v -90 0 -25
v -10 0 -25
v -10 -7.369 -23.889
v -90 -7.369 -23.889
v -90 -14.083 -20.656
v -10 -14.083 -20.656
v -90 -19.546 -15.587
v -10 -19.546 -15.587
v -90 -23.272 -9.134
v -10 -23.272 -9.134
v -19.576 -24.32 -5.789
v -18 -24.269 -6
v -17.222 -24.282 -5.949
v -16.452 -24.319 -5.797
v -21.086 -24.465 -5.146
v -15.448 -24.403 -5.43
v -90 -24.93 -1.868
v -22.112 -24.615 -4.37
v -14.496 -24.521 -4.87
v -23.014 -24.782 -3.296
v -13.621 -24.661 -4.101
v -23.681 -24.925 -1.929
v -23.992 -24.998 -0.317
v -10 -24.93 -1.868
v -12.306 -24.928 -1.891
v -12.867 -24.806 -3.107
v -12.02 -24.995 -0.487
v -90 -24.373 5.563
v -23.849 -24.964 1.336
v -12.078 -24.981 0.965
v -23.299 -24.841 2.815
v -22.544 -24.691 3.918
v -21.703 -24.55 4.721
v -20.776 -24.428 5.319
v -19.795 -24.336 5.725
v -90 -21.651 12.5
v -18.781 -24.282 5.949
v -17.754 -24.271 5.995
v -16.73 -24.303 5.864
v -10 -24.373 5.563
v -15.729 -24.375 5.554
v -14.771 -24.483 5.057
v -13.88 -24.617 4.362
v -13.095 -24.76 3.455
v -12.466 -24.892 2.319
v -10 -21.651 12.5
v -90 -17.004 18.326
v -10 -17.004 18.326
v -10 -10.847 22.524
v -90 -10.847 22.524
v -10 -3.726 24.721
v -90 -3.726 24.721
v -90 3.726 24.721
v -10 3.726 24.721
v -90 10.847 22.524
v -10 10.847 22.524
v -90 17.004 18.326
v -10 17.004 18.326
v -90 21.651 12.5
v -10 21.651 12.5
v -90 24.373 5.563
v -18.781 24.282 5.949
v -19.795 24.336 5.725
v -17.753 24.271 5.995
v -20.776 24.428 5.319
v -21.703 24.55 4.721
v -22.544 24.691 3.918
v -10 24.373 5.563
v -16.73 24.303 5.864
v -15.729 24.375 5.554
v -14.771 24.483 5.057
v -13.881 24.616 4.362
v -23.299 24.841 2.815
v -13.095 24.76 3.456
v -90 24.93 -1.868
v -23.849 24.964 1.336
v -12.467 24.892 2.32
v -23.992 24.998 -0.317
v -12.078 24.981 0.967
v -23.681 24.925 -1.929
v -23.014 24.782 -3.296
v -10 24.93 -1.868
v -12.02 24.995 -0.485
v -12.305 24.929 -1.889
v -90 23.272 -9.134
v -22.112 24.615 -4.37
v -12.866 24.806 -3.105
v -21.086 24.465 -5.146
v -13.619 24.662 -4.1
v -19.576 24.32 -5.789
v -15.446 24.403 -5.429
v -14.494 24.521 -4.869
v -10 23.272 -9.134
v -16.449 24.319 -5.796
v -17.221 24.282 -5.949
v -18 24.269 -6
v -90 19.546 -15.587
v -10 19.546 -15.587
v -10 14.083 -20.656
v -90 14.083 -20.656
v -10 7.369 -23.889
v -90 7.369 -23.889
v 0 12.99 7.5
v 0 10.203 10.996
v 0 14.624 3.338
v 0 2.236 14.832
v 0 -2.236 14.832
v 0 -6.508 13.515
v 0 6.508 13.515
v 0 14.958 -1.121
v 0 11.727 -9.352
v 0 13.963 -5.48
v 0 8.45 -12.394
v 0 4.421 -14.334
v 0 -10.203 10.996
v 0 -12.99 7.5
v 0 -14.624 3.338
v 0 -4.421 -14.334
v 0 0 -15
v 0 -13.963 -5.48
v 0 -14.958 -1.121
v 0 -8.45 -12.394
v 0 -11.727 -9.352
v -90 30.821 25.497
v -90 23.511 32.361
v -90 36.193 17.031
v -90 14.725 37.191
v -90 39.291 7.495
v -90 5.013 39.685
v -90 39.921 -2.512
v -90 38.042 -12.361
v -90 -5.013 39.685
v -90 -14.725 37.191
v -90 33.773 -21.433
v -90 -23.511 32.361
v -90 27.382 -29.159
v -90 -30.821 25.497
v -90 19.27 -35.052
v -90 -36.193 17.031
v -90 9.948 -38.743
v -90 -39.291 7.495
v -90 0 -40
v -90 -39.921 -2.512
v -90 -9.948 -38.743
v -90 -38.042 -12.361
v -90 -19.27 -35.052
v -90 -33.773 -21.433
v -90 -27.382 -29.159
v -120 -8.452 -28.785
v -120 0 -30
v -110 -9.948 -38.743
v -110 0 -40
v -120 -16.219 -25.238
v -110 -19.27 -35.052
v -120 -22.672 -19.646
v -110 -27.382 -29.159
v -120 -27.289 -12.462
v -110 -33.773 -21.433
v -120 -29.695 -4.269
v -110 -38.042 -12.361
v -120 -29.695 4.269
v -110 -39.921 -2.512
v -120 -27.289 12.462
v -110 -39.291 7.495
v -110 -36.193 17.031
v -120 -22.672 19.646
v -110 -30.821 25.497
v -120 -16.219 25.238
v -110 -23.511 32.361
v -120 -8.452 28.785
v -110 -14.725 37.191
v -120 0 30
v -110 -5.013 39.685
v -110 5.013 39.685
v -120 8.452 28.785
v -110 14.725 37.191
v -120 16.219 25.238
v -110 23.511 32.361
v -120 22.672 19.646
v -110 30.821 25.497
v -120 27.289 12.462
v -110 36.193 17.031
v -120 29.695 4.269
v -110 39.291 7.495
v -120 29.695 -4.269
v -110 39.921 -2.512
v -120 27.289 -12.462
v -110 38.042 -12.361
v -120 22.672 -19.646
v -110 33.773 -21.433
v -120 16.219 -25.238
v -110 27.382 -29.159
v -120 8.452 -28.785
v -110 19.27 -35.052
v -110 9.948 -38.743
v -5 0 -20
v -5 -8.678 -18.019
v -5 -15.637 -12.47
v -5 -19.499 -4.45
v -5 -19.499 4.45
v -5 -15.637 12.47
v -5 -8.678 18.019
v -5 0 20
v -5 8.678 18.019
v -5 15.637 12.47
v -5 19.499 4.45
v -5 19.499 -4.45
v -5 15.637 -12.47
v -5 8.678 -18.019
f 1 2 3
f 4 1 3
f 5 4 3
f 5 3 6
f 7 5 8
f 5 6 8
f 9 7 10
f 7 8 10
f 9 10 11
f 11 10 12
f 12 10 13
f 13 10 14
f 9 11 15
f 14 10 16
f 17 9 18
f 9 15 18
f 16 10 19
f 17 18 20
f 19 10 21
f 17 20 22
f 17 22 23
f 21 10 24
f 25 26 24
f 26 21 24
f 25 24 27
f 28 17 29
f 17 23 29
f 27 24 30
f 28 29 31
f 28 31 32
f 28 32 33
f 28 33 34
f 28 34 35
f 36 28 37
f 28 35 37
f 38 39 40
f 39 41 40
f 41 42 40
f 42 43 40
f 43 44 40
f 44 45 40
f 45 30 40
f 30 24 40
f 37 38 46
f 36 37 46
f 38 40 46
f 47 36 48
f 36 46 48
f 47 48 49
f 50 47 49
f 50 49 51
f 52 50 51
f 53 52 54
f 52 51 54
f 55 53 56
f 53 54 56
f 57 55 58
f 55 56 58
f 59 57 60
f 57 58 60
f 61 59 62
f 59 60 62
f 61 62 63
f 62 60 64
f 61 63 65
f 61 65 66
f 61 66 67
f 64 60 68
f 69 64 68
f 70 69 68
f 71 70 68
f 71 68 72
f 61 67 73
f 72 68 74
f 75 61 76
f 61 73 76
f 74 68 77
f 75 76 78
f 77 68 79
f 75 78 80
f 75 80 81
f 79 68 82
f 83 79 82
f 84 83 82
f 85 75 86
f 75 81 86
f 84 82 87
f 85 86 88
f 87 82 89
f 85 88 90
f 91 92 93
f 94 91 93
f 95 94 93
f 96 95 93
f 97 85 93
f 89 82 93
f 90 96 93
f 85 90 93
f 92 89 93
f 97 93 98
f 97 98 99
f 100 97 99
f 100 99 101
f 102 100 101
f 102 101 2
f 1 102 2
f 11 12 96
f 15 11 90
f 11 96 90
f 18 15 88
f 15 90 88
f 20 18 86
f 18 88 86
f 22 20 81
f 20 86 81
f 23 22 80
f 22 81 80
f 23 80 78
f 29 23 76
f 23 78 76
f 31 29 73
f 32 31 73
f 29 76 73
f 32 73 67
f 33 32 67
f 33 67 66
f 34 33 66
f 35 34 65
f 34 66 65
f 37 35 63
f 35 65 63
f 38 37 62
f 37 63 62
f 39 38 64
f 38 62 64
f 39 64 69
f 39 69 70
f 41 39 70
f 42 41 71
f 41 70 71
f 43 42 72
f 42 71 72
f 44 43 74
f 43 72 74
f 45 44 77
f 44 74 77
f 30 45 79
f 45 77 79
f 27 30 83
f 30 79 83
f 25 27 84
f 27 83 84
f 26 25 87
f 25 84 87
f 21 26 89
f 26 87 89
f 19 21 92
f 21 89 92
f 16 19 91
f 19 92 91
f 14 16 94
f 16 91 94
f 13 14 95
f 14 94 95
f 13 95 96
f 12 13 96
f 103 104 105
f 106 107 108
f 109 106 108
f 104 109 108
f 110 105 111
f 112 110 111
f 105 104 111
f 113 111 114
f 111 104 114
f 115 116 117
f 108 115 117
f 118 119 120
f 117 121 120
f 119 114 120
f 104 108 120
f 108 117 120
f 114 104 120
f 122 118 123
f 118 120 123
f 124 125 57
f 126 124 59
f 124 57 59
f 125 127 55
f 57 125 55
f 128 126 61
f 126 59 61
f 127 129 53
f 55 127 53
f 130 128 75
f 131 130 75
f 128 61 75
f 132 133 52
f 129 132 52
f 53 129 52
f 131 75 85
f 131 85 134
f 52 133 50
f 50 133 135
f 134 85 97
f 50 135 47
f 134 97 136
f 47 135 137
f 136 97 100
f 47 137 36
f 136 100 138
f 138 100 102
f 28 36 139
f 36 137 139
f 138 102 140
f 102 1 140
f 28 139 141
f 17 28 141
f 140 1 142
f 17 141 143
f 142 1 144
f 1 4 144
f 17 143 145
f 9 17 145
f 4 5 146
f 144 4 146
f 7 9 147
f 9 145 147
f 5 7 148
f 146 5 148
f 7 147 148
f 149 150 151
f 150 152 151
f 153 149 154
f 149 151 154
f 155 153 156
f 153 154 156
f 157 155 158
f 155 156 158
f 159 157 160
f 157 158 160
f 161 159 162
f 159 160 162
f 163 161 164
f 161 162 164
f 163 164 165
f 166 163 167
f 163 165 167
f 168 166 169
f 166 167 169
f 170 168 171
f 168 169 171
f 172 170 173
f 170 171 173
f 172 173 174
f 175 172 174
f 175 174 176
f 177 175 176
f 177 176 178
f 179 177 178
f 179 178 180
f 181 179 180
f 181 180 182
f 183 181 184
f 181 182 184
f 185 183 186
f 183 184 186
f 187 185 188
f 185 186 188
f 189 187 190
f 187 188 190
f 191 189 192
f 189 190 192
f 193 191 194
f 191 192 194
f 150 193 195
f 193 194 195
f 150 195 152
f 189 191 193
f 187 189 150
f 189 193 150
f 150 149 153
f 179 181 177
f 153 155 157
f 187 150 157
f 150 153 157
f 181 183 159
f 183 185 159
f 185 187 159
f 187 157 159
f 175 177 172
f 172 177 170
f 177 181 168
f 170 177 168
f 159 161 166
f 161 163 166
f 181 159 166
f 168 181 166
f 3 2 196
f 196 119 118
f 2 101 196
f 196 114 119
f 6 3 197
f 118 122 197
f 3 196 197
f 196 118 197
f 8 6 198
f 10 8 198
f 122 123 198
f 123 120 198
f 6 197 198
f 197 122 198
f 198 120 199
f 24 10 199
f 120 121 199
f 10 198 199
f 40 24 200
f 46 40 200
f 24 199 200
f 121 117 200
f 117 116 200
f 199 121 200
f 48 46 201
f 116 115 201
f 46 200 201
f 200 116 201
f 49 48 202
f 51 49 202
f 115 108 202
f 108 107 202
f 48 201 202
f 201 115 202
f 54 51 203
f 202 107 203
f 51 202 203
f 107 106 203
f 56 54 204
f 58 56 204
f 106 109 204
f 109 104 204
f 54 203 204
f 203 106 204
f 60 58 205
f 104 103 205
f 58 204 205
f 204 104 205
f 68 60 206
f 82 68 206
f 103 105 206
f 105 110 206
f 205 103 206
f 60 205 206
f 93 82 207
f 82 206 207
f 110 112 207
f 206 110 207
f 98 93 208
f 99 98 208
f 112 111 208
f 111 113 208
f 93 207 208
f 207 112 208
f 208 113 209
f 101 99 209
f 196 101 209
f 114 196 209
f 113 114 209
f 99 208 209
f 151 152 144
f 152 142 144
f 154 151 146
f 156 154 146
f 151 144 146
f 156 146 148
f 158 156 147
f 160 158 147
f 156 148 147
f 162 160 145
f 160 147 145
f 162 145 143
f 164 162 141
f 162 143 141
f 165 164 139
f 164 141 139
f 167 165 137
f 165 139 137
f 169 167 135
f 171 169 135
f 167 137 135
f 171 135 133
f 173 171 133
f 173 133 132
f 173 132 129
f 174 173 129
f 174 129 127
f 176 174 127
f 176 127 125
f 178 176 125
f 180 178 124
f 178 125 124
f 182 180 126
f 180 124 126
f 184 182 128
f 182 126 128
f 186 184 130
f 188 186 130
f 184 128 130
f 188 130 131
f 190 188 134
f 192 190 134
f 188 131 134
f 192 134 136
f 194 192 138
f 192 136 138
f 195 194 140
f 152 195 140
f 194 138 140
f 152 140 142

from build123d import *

# Parameters (mm, degrees)
SKETCH_2_W = 6
SKETCH_2_H = 84


with BuildPart() as part:
    # 草圖1 → 迴轉1 (revolve)
    with BuildSketch(Plane.XY, mode=Mode.PRIVATE) as revolve_1_sk:
        Polygon((0, 0), (-120, 0), (-120, 30), (-110, 40), (-90, 40), (-90, 25), (-10, 25), (0, 15), align=None)
    revolve(revolve_1_sk.sketch.rotate(Axis((0, 0, 0), (-1, 0, 0)), 90), axis=Axis((0, 0, 0), (-1, 0, 0)))

    # 草圖2 → 迴轉2 (revolve, cut)
    with BuildSketch(Plane.XY, mode=Mode.PRIVATE) as cut_revolve_2_sk:
        with Locations((-21, -9)):
            Rectangle(SKETCH_2_W, SKETCH_2_H)
    revolve(cut_revolve_2_sk.sketch.rotate(Axis((-18, -51, 0), (0, 1, 0)), 270), axis=Axis((-18, -51, 0), (0, 1, 0)), mode=Mode.SUBTRACT)


solid = part.part
